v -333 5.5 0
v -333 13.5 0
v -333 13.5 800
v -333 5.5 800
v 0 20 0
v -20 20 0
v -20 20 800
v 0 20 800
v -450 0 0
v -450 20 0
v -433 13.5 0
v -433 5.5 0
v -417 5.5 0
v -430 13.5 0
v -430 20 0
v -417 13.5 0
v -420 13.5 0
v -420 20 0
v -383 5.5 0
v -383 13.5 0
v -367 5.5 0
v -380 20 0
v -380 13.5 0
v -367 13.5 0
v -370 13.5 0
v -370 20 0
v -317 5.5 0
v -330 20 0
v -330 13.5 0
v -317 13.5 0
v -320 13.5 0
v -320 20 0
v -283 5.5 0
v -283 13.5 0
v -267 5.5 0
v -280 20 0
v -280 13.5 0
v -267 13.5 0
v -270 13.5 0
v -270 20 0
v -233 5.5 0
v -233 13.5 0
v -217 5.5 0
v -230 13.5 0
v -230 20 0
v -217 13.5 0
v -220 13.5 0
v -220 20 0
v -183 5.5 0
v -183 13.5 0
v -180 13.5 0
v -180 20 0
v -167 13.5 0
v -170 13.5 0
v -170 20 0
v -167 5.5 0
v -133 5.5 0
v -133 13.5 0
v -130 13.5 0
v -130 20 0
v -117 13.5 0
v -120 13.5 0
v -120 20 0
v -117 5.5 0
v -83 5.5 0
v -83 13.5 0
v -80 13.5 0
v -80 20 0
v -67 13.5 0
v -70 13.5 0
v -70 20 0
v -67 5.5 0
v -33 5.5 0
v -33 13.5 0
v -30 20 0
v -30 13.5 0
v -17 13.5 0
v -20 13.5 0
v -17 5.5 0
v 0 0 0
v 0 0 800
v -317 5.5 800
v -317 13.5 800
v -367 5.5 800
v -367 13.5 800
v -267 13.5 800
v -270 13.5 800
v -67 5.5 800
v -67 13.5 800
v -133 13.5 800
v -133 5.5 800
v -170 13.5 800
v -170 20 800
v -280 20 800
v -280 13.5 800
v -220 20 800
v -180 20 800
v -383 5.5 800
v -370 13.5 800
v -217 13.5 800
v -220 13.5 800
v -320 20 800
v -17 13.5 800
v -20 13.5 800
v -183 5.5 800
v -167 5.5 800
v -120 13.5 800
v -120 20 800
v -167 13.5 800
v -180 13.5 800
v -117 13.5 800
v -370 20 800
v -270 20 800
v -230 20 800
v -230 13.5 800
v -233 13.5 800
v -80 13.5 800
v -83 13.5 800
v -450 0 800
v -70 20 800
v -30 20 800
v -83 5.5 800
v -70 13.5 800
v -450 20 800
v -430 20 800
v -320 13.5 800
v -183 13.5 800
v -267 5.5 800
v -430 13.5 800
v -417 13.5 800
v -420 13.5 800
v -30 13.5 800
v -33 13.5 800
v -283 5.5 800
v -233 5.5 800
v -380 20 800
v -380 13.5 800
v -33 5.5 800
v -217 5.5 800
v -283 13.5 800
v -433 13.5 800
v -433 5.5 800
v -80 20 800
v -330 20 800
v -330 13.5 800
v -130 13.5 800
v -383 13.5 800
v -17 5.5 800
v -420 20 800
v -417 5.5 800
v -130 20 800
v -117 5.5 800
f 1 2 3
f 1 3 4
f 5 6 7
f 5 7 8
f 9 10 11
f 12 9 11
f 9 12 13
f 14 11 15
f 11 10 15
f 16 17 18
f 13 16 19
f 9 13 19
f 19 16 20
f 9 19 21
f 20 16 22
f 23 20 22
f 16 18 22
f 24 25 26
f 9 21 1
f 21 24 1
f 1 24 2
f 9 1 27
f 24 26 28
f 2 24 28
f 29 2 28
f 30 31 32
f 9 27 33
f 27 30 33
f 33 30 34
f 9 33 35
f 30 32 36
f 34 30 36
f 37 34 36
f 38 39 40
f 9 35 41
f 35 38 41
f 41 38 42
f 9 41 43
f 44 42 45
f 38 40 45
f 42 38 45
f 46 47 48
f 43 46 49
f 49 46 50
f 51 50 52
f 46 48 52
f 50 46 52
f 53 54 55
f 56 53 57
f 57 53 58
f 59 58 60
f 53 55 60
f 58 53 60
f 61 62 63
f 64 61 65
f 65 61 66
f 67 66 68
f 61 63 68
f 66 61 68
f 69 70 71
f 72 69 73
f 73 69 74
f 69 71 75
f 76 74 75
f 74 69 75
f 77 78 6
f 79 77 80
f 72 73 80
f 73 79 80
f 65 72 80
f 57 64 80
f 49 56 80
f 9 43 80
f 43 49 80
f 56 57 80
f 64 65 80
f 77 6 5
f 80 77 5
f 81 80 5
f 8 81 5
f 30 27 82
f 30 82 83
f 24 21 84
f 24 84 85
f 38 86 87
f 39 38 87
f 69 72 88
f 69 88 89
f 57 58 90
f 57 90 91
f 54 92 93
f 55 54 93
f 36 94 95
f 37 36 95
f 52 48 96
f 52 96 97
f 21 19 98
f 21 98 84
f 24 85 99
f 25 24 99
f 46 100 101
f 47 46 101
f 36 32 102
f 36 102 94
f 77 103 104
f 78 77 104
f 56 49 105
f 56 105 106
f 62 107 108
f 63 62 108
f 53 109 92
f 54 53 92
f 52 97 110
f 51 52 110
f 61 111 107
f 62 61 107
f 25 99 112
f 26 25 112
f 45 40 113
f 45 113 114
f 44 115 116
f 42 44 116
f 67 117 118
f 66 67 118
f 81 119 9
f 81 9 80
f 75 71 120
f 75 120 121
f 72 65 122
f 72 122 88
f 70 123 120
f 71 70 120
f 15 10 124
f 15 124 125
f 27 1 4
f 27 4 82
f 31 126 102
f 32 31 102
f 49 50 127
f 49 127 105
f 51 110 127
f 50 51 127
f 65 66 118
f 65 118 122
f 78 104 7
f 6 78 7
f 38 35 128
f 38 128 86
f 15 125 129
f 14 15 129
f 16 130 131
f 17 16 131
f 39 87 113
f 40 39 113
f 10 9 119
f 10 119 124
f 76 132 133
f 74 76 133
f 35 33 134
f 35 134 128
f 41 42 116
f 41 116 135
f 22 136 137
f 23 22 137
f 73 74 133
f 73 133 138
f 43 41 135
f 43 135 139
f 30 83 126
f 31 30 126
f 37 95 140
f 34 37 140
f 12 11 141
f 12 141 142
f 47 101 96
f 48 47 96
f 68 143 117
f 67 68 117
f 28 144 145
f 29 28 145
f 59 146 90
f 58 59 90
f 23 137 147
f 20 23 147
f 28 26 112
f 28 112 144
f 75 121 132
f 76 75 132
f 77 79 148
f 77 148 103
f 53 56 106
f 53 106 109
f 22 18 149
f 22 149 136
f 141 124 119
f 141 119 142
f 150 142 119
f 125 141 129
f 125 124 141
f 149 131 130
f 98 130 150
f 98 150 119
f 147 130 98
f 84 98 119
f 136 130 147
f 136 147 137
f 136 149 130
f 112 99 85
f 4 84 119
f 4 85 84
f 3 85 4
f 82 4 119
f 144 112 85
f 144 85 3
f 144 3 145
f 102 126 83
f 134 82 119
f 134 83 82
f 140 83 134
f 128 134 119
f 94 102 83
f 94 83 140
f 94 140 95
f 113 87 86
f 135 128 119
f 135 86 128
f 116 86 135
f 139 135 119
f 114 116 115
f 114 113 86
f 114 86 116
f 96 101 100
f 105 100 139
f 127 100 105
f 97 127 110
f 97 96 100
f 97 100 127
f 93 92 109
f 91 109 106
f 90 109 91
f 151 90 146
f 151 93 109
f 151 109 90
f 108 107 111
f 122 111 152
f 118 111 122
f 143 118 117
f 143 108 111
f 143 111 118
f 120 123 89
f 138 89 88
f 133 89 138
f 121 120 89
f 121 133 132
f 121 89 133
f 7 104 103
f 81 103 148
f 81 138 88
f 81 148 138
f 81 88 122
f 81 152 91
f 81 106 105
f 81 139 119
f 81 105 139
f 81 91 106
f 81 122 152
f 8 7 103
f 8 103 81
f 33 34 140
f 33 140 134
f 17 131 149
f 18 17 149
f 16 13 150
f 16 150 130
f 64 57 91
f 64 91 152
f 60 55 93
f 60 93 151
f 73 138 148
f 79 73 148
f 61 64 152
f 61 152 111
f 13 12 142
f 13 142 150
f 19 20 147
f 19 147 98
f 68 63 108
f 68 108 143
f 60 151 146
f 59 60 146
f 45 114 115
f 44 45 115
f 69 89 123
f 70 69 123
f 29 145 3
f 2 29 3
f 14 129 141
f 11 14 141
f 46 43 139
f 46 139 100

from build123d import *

# Parameters (mm, degrees)
SKETCH1_W           = 450
SKETCH1_H           = 20
BOSS_EXTRUDE1_DEPTH = 800
CUT_EXTRUDE1_DEPTH  = 919.095855562


with BuildPart() as part:
    # Sketch1 → Boss-Extrude1 (new body)
    with BuildSketch(Plane.XY):
        with Locations((-225, 10)):
            Rectangle(SKETCH1_W, SKETCH1_H)
    extrude(amount=BOSS_EXTRUDE1_DEPTH)

    # Sketch2 → Cut-Extrude1 (cut, through all)
    with BuildSketch(Plane.XY.offset(800)):
        Polygon((-430, 20), (-430, 13.5), (-433, 13.5), (-433, 5.5), (-417, 5.5), (-417, 13.5), (-420, 13.5), (-420, 20), align=None)
        Polygon((-380, 20), (-380, 13.5), (-383, 13.5), (-383, 5.5), (-367, 5.5), (-367, 13.5), (-370, 13.5), (-370, 20), align=None)
        Polygon((-330, 20), (-330, 13.5), (-333, 13.5), (-333, 5.5), (-317, 5.5), (-317, 13.5), (-320, 13.5), (-320, 20), align=None)
        Polygon((-280, 20), (-280, 13.5), (-283, 13.5), (-283, 5.5), (-267, 5.5), (-267, 13.5), (-270, 13.5), (-270, 20), align=None)
        Polygon((-230, 20), (-230, 13.5), (-233, 13.5), (-233, 5.5), (-217, 5.5), (-217, 13.5), (-220, 13.5), (-220, 20), align=None)
        Polygon((-180, 20), (-180, 13.5), (-183, 13.5), (-183, 5.5), (-167, 5.5), (-167, 13.5), (-170, 13.5), (-170, 20), align=None)
        Polygon((-130, 20), (-130, 13.5), (-133, 13.5), (-133, 5.5), (-117, 5.5), (-117, 13.5), (-120, 13.5), (-120, 20), align=None)
        Polygon((-80, 20), (-80, 13.5), (-83, 13.5), (-83, 5.5), (-67, 5.5), (-67, 13.5), (-70, 13.5), (-70, 20), align=None)
        Polygon((-30, 20), (-30, 13.5), (-33, 13.5), (-33, 5.5), (-17, 5.5), (-17, 13.5), (-20, 13.5), (-20, 20), align=None)
        Polygon((20, 20), (20, 13.5), (17, 13.5), (17, 5.5), (33, 5.5), (33, 13.5), (30, 13.5), (30, 20), align=None)
    extrude(amount=-CUT_EXTRUDE1_DEPTH, mode=Mode.SUBTRACT)


solid = part.part
